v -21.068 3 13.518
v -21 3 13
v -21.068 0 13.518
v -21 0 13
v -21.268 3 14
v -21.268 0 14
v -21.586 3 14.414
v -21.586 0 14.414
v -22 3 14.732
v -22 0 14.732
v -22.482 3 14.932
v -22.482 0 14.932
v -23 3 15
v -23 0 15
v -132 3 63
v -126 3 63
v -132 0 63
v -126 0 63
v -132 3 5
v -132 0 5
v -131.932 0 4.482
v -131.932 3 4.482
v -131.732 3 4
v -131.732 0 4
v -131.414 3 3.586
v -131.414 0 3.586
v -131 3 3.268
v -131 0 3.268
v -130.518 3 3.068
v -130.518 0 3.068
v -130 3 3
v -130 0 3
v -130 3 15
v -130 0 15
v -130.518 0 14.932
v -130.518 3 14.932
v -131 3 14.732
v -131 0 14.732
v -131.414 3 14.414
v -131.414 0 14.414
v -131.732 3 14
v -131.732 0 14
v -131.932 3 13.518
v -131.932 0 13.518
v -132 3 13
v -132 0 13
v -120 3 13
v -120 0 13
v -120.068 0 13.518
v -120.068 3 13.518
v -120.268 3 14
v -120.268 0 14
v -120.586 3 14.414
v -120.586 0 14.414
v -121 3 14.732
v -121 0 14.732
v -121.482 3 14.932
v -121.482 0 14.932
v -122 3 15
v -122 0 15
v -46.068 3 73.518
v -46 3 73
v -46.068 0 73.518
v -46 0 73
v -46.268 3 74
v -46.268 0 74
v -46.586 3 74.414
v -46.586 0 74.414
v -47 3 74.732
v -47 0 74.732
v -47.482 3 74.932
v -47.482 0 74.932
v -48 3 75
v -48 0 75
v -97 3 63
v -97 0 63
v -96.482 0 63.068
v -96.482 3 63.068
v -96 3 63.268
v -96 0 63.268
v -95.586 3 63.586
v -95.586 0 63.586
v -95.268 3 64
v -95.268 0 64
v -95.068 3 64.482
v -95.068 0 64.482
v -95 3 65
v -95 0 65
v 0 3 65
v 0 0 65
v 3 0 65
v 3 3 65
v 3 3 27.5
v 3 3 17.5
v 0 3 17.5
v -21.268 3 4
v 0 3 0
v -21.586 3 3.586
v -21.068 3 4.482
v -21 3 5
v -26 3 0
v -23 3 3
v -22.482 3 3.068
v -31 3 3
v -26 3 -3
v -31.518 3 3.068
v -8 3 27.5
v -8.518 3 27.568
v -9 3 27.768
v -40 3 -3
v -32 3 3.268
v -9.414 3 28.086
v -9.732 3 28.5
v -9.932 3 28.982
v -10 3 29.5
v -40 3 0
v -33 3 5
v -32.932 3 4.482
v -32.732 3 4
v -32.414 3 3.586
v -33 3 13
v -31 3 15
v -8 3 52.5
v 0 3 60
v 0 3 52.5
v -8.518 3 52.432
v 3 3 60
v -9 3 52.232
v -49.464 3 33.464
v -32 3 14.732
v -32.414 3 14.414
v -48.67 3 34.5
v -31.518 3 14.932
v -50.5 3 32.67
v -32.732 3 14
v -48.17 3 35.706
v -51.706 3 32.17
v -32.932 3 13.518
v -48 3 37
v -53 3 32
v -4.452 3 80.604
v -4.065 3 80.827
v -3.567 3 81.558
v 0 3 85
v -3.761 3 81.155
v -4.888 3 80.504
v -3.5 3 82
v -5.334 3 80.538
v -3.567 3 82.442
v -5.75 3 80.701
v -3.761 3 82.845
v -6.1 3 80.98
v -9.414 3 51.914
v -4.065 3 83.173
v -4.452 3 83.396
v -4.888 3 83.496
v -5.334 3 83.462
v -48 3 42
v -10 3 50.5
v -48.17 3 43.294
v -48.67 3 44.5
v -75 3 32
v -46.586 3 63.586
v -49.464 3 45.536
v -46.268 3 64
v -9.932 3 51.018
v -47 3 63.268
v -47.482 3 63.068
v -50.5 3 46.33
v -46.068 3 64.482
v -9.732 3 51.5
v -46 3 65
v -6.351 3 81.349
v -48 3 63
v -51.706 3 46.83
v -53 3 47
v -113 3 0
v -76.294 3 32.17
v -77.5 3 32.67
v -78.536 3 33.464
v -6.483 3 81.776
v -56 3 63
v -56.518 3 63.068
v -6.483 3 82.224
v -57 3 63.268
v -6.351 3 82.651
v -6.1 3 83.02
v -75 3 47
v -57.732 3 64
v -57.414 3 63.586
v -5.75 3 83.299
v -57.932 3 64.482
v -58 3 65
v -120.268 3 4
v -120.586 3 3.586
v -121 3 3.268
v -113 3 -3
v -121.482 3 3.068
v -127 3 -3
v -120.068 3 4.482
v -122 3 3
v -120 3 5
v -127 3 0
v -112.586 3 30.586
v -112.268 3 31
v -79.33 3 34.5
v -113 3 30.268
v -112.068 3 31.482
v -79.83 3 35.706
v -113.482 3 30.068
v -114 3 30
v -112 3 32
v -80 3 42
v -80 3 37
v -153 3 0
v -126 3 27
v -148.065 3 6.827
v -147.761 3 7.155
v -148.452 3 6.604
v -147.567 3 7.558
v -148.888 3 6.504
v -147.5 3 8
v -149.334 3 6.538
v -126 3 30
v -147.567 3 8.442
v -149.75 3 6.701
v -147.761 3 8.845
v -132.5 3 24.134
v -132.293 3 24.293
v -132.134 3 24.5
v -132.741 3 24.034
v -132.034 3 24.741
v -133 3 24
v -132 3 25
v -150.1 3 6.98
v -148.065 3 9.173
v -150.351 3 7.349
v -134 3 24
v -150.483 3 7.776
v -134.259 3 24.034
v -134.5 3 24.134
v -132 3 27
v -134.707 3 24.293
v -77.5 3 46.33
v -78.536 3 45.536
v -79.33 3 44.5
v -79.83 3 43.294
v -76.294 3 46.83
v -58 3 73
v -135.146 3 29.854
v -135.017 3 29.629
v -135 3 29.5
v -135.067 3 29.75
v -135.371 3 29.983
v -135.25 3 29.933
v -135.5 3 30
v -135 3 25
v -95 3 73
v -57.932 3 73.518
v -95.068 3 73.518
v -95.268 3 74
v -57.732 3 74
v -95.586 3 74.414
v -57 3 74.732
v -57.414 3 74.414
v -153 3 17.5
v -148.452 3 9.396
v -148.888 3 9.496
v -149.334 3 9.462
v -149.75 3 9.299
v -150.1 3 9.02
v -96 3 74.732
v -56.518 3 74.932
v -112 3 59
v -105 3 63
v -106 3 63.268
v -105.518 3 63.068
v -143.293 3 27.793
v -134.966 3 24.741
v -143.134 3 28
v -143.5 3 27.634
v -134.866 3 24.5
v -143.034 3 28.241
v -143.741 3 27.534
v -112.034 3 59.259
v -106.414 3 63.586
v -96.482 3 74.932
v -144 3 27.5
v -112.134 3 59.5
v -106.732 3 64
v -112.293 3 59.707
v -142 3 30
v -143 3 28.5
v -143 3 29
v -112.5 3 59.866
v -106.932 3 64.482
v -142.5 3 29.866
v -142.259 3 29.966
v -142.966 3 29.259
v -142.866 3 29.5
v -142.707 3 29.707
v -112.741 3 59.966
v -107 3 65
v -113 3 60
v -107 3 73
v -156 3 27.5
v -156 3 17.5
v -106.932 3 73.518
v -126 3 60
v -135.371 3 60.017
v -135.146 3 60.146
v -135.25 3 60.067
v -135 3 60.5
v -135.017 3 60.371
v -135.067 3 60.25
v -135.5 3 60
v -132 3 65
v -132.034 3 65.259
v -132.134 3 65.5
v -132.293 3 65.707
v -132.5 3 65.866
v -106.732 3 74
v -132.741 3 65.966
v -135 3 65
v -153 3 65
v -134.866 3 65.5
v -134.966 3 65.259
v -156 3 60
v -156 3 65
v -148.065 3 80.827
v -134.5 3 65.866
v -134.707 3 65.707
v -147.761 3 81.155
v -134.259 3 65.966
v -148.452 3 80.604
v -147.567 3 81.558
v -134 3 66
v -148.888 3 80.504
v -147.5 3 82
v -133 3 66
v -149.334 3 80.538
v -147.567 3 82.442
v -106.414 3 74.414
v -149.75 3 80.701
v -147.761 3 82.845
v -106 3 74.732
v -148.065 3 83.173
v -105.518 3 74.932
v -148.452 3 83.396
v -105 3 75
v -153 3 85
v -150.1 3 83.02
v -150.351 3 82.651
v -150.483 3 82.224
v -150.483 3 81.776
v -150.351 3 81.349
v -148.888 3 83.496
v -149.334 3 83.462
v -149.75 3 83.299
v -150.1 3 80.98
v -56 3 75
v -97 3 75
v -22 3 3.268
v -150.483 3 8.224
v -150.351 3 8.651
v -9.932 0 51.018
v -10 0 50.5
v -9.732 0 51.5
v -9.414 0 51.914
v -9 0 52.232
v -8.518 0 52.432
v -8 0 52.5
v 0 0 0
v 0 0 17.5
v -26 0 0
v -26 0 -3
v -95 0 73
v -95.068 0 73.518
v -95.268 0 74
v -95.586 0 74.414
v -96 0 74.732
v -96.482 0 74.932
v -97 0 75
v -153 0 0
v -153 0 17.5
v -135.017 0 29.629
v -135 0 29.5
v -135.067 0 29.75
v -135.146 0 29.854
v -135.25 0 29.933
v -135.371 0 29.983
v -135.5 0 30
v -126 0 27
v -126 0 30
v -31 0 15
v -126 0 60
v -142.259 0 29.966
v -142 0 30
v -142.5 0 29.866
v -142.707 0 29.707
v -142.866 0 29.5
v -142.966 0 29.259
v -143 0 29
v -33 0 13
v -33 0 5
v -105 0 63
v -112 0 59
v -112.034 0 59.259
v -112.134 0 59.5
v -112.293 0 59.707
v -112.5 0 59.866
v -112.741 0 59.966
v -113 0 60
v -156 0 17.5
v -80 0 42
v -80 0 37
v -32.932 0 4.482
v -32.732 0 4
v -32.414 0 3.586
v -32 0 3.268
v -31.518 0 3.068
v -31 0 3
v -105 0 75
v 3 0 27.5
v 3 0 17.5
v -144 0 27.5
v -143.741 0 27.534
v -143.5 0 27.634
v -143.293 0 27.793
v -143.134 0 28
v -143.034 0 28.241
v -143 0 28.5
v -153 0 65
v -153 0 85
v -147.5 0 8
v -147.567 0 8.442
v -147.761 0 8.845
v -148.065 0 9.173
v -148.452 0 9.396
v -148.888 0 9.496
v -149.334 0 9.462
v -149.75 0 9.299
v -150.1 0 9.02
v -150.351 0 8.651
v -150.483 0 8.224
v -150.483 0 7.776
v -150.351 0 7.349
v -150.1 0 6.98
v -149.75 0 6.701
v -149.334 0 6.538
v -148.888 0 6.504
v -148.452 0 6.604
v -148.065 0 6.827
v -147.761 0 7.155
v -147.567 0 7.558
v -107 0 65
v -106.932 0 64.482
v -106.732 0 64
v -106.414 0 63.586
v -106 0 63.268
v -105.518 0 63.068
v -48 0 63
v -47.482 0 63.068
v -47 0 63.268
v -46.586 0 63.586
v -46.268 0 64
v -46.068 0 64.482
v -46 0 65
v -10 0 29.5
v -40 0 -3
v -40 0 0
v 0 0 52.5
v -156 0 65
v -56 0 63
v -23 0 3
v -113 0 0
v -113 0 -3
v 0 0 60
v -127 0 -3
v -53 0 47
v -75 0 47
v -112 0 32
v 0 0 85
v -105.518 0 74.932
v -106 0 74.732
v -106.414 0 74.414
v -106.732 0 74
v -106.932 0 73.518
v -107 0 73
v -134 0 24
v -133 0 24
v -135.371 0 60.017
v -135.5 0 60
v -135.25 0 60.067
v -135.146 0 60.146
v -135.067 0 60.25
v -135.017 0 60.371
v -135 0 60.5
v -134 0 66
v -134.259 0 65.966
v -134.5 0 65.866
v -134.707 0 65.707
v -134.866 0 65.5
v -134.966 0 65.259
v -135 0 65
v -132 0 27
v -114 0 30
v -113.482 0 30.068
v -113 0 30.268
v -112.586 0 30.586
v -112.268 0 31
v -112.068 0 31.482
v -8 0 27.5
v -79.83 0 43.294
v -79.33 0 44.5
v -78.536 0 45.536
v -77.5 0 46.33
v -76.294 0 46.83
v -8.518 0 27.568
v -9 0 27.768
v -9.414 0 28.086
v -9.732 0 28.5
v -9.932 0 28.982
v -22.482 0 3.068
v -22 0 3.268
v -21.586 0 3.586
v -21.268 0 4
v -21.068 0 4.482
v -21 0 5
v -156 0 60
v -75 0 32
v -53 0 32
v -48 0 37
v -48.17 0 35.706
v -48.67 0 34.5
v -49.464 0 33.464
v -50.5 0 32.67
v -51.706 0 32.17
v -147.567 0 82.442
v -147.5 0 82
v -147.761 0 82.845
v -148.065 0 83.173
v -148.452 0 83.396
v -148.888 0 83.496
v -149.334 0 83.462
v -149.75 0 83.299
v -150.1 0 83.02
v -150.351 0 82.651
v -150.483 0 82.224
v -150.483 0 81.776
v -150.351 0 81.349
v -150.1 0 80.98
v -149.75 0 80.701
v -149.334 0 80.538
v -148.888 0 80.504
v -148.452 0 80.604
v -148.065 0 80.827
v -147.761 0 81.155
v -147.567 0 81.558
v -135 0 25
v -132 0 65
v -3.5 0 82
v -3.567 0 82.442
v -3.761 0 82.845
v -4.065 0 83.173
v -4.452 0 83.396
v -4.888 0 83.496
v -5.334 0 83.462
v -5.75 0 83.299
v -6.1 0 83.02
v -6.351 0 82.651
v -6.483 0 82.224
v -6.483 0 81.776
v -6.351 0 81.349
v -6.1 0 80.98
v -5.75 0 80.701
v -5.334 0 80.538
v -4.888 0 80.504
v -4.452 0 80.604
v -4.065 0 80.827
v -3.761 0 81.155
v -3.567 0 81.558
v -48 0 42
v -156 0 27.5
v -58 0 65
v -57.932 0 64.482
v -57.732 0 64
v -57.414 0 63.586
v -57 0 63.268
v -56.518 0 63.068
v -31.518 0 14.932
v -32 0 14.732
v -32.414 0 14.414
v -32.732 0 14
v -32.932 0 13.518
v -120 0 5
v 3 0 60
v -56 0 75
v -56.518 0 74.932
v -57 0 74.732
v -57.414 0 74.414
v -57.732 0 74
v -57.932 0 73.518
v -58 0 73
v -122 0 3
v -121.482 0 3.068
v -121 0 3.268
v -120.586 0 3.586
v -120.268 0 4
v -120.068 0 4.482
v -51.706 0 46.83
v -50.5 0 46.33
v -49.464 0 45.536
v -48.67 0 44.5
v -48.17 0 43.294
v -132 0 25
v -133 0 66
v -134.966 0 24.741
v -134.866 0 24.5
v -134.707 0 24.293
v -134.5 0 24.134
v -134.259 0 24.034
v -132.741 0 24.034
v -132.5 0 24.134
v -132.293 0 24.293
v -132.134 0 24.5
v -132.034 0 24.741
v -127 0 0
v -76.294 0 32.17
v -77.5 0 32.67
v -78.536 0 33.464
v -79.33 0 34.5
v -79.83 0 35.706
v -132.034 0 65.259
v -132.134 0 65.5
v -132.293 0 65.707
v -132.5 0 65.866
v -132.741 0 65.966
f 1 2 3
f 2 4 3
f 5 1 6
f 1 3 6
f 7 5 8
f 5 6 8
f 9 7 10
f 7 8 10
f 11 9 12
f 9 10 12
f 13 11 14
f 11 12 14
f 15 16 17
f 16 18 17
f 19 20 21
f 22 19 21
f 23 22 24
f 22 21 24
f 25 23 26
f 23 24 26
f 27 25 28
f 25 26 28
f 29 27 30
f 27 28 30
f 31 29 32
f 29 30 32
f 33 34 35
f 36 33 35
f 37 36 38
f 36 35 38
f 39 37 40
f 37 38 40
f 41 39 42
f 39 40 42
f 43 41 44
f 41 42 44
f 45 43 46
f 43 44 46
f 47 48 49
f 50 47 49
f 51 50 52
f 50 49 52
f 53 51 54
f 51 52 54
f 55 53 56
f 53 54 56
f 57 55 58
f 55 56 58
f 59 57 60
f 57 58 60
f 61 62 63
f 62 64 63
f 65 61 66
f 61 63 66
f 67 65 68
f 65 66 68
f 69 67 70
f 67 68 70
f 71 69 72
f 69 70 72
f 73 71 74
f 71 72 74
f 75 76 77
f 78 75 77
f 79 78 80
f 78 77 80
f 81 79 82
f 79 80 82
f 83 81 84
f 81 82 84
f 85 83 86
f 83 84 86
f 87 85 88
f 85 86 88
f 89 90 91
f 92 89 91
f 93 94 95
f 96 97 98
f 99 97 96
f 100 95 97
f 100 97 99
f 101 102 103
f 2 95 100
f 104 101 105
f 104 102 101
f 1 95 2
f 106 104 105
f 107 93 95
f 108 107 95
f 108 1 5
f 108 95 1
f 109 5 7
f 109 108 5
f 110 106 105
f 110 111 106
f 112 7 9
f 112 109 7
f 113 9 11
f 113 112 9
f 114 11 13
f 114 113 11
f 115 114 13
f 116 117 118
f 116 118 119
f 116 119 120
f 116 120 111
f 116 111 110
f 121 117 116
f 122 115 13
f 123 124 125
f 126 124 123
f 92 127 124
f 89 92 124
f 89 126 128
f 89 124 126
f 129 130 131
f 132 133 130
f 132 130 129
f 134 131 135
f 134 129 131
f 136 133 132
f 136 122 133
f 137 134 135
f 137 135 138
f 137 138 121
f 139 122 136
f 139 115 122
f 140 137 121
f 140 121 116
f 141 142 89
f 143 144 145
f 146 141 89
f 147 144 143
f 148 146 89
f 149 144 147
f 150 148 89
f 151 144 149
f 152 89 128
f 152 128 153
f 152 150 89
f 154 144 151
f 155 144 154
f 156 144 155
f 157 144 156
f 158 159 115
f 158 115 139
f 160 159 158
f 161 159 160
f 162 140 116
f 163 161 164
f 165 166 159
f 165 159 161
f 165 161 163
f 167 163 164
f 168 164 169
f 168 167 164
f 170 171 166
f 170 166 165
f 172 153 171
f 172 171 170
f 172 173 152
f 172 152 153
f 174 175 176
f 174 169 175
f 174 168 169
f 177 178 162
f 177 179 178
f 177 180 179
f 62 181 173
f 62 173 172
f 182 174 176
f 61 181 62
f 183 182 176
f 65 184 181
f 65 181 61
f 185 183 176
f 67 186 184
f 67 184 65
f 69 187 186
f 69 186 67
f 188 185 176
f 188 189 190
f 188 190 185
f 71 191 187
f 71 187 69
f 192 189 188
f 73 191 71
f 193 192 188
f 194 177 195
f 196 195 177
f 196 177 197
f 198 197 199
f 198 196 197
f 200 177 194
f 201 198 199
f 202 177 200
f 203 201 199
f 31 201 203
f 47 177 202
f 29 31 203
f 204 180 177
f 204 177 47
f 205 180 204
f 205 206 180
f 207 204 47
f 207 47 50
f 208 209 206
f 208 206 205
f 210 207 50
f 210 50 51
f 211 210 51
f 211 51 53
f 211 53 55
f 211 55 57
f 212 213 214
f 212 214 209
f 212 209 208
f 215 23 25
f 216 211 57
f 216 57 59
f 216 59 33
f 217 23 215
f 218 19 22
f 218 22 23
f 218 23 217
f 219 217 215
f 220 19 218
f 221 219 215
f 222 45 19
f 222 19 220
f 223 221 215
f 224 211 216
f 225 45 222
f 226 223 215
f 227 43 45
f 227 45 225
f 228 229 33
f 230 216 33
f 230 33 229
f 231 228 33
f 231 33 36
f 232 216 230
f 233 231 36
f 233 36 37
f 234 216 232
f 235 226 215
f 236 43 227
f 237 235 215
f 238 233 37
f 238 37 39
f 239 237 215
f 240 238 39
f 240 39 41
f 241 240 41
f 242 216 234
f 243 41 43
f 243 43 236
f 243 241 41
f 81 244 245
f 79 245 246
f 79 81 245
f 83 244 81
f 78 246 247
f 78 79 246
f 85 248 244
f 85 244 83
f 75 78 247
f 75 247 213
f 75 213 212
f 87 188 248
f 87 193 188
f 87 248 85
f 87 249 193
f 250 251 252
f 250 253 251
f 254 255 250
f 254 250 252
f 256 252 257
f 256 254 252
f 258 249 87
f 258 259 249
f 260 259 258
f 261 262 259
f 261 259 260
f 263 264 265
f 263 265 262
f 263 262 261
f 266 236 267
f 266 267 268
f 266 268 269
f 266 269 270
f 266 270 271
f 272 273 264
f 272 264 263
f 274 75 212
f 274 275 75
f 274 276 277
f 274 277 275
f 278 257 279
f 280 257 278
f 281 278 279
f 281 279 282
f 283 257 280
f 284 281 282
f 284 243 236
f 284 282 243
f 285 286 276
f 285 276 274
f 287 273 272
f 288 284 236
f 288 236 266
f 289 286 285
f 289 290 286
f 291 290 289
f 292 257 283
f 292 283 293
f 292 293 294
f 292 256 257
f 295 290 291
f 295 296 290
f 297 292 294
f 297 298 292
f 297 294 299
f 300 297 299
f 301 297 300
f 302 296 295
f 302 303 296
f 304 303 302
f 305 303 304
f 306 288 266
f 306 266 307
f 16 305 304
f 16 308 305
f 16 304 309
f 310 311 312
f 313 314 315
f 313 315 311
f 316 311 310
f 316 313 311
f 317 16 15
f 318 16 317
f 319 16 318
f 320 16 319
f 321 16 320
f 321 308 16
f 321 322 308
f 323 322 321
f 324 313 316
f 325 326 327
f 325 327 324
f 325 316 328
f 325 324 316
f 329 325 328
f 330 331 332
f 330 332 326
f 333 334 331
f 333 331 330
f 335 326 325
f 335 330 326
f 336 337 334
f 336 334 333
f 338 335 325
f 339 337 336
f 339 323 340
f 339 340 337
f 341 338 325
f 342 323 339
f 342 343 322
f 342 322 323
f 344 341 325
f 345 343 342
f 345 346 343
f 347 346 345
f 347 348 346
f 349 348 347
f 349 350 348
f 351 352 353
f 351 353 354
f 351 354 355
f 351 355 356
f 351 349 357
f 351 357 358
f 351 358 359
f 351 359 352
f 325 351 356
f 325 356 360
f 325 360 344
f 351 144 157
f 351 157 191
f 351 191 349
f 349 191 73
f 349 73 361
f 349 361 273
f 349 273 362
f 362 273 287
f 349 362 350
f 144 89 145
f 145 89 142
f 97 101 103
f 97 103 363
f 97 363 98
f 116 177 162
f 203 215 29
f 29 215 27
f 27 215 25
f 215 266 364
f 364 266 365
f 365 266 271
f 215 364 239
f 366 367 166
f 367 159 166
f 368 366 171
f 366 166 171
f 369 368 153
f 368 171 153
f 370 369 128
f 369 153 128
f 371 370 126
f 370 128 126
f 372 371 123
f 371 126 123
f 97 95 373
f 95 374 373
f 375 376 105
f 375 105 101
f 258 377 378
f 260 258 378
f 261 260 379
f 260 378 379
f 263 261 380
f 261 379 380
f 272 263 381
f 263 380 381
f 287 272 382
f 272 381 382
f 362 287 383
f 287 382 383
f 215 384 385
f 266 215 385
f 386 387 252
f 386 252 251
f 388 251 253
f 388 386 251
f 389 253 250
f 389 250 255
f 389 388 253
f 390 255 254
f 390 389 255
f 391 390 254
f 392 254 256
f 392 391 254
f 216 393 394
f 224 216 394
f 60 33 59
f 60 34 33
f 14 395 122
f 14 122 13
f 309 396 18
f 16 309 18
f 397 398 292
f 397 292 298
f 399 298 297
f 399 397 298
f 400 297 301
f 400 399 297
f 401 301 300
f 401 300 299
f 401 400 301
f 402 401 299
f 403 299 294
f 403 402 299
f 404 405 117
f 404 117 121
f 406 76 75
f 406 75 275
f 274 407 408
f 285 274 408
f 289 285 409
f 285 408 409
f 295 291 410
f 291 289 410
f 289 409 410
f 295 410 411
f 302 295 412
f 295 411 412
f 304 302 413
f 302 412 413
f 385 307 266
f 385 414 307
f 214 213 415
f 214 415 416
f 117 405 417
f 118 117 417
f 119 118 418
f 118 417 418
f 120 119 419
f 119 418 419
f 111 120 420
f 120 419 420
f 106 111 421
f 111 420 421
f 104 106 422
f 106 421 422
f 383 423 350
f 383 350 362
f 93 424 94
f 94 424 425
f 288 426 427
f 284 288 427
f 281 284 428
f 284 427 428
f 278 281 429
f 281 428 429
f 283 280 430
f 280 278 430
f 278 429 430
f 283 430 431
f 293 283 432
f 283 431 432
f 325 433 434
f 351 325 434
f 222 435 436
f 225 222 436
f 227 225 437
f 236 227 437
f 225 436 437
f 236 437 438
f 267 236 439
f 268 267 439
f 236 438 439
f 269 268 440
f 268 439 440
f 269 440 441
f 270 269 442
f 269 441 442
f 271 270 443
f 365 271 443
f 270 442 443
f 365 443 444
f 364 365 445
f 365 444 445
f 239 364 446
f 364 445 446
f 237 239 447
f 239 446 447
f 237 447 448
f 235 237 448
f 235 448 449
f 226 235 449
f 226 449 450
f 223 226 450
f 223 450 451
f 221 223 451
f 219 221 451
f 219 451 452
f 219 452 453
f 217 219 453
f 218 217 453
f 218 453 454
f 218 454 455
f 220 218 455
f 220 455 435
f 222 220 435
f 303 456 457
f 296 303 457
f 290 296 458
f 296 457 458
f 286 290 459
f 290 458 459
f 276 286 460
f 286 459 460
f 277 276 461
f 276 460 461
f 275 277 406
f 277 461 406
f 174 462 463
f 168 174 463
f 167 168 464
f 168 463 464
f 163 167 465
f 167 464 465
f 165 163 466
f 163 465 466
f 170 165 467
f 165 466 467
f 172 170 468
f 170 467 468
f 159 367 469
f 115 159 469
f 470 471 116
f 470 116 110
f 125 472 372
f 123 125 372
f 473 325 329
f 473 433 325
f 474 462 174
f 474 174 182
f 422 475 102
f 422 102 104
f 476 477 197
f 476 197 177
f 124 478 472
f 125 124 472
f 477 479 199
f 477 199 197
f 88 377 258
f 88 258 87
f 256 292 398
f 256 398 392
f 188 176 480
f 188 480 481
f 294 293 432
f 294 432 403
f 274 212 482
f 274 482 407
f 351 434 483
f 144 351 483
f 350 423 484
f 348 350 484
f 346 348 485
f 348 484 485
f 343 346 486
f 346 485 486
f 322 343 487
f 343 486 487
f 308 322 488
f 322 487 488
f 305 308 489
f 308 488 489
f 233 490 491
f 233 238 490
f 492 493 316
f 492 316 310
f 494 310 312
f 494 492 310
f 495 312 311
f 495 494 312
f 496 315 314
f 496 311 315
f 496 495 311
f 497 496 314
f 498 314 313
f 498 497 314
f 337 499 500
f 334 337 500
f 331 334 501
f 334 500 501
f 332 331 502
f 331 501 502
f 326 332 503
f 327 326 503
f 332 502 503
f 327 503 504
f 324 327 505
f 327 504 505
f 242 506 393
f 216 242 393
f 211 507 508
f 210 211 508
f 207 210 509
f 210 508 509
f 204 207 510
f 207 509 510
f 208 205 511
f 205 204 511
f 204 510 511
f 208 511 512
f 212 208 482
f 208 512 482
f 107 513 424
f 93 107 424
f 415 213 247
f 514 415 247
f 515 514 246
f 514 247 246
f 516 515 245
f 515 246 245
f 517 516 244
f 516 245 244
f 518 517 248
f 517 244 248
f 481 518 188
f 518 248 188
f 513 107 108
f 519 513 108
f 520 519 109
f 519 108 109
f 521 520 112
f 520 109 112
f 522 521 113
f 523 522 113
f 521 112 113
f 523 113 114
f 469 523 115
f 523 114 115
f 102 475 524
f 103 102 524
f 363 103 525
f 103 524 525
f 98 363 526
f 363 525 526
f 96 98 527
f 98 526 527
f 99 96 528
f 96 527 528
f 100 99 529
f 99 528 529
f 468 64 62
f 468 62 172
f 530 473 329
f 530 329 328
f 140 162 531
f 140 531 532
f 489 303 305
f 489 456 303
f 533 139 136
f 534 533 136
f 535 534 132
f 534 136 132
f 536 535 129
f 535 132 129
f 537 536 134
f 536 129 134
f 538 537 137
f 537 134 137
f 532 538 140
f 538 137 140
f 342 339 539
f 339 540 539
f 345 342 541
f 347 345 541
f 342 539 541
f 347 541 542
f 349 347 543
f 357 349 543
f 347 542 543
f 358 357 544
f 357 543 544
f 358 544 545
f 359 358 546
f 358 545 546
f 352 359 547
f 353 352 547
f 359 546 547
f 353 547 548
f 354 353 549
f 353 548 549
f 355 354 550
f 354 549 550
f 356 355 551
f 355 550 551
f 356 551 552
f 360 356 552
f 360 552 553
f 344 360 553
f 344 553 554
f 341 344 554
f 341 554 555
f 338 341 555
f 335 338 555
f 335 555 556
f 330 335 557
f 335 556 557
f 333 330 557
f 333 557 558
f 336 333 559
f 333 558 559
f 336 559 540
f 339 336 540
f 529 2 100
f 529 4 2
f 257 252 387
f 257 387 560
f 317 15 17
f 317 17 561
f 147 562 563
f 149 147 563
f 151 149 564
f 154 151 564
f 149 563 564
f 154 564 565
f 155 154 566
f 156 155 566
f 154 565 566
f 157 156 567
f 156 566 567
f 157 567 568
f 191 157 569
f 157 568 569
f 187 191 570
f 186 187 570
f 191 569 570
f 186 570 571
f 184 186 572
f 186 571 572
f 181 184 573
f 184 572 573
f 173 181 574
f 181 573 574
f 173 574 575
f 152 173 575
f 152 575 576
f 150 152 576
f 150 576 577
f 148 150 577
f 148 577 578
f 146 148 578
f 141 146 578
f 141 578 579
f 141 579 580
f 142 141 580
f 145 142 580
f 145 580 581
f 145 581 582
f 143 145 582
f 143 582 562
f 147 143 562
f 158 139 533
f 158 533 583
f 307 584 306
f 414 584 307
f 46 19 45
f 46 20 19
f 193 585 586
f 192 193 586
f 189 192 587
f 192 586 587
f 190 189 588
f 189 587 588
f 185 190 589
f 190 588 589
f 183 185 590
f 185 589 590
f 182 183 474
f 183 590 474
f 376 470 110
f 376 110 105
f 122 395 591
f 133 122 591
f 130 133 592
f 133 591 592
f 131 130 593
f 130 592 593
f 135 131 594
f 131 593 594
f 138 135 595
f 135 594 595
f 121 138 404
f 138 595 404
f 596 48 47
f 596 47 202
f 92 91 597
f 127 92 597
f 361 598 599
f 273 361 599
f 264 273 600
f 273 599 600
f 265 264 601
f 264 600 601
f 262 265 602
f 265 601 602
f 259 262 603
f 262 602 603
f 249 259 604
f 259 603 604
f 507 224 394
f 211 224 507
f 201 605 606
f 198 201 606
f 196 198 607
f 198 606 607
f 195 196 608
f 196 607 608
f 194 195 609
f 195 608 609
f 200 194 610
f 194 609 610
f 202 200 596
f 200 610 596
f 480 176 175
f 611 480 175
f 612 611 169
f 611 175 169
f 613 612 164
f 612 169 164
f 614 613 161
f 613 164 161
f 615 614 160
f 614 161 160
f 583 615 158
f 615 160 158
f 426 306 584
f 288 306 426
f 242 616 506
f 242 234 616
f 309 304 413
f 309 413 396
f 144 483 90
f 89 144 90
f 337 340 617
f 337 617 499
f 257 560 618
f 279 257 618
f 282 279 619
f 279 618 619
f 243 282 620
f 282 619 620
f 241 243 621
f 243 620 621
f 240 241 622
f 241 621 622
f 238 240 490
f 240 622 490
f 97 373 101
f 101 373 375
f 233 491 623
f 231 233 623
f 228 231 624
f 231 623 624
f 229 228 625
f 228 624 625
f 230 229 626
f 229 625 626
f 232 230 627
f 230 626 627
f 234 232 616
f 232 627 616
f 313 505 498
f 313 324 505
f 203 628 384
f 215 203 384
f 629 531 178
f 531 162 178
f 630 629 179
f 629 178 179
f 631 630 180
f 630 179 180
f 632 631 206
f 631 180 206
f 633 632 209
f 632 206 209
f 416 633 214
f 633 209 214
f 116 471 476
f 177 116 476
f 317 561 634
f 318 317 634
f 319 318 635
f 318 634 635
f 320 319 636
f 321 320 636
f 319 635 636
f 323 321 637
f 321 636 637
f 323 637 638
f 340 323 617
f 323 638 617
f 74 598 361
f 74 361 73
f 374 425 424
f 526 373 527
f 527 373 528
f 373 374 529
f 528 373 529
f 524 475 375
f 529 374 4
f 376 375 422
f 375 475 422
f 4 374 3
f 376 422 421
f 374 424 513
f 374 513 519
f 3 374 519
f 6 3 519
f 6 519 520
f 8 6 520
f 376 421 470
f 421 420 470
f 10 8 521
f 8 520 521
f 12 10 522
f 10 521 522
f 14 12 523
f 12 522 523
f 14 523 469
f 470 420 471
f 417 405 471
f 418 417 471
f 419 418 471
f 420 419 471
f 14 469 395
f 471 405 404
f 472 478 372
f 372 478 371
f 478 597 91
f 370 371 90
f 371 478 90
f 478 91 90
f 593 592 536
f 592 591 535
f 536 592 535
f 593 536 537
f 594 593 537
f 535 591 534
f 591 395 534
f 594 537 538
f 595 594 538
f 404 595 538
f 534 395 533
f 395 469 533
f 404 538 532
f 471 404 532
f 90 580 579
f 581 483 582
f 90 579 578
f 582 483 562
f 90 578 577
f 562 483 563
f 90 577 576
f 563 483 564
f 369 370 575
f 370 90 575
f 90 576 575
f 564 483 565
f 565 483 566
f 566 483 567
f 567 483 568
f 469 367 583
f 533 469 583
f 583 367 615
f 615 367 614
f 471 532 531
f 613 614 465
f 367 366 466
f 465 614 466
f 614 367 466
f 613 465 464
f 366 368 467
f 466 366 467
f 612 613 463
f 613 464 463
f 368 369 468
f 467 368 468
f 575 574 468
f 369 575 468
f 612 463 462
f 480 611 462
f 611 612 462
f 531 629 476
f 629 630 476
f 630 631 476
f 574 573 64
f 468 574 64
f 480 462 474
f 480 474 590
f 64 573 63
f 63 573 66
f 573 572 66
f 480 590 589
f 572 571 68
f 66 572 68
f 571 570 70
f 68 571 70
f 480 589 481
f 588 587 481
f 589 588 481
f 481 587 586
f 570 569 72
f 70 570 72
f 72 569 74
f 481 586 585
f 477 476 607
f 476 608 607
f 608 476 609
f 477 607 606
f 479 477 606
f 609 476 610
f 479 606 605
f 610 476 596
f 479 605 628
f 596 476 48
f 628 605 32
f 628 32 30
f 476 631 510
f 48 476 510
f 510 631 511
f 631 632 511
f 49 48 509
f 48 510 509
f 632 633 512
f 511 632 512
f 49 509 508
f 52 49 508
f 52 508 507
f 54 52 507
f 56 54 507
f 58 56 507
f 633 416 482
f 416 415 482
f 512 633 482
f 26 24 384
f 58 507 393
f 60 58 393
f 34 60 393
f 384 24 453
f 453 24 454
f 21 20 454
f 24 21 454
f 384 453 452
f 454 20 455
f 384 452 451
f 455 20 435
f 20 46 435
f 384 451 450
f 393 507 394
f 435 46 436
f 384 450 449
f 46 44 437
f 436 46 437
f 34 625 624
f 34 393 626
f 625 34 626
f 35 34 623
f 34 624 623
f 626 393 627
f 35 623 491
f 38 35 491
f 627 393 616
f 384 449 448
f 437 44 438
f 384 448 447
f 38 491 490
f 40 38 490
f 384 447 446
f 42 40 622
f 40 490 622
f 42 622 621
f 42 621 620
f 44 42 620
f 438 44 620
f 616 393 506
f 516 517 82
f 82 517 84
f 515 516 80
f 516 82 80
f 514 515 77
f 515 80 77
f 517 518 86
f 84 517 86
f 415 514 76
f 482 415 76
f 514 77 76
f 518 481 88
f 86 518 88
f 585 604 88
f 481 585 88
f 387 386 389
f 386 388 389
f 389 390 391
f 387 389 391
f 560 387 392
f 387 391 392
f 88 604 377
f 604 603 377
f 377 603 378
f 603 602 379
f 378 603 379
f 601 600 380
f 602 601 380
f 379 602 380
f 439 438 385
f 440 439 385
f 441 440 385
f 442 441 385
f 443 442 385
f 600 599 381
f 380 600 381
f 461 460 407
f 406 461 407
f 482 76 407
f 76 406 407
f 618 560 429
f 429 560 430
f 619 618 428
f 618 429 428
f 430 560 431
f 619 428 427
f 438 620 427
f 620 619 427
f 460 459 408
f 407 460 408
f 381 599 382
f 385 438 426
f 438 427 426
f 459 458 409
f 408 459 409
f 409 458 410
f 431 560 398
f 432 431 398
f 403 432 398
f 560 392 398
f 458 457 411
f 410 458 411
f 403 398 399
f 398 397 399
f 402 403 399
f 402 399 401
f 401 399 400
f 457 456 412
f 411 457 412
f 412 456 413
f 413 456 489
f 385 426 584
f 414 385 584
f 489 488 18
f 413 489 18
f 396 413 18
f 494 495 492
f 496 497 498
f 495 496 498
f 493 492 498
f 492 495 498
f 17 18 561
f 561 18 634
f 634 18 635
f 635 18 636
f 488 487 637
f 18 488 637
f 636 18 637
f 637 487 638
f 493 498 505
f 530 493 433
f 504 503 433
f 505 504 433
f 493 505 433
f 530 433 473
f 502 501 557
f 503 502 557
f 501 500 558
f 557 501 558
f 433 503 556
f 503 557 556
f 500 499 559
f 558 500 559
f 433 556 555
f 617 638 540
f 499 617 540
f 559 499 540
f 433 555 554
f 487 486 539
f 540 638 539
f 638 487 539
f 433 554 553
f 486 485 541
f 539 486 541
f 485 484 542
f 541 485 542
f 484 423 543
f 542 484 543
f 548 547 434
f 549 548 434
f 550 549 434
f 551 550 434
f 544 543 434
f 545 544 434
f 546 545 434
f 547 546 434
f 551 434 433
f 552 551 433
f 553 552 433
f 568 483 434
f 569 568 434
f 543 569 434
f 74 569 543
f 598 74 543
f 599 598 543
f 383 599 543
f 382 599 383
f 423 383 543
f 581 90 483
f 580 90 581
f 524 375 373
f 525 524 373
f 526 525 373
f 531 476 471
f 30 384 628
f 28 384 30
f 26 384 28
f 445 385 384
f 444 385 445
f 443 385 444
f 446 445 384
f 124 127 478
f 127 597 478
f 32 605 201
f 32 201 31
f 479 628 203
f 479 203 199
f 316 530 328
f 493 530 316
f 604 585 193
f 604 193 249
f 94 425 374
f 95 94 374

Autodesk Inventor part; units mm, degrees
ref_plane "YZ Plane" through (0, 0, 0) normal (1, 0, 0) x (0, 1, 0)
ref_plane "XZ Plane" through (0, 0, 0) normal (0, 1, 0) x (-1, 0, 0)
ref_plane "XY Plane" through (0, 0, 0) normal (0, 0, 1) x (1, 0, 0)
sketch "Sketch1" plane through (0, 0, 0) normal (0, 1, 0) x (-1, 0, 0)
  line L0 (153, 85) -> (0, 85)
  line L1 (0, 65) -> (-3, 65)
  line L2 (-3, 65) -> (-3, 60)
  line L3 (-3, 60) -> (0, 60)
  line L4 (0, 40) -> (153, 40) construction
  line L5 (0, 27.5) -> (-3, 27.5)
  line L6 (-3, 27.5) -> (-3, 17.5)
  line L7 (-3, 17.5) -> (0, 17.5)
  line L8 (153, 65) -> (156, 65)
  line L9 (156, 65) -> (156, 60)
  line L10 (156, 60) -> (153, 60)
  line L11 (153, 27.5) -> (156, 27.5)
  line L12 (156, 27.5) -> (156, 17.5)
  line L13 (156, 17.5) -> (153, 17.5)
  line L14 (153, 65) -> (153, 85)
  line L15 (153, 0) -> (153, 17.5)
  line L16 (153, 27.5) -> (153, 60)
  line L17 (0, 85) -> (0, 65)
  line L18 (0, 60) -> (0, 27.5)
  line L19 (0, 17.5) -> (0, 0)
  line L20 (40, 0) -> (40, -3)
  line L21 (40, -3) -> (26, -3)
  line L22 (26, -3) -> (26, 0)
  line L23 (127, 0) -> (127, -3)
  line L24 (127, -3) -> (113, -3)
  line L25 (113, -3) -> (113, 0)
  line L26 (0, 0) -> (26, 0)
  line L27 (40, 0) -> (113, 0)
  line L28 (127, 0) -> (153, 0)
  dimension "d0" = 85
  dimension "d1" = 153
  dimension "d3" = 3
  dimension "d4" = 20
  dimension "d5" = 10
  dimension "d6" = 3
  dimension "d9" = 3
  dimension "d10" = 10
  dimension "d11" = 3
  dimension "d12" = 12.5
  dimension "d13" = 20
  dimension "d16" = 20
  dimension "d39" = 14
  dimension "d40" = 3
  dimension "d41" = 14
  dimension "d42" = 3
  dimension "d43" = 26
  dimension "d44" = 26
  dimension "d64" = 12.5
  dimension "d65" = 5
  dimension "d66" = 5
extrude "Extrusion1" add sketch "Sketch1" along normal blind 3
sketch "Sketch2" plane through (0, 3, 0) normal (0, 1, 0) x (1, 0, 0)
  line L0 (-153, -27.5) -> (-153, -60) projected
  line L1 (0, -60) -> (0, -27.5) projected
  line L2 (-143, -30) -> (-135, -30)
  line L3 (-135, -60) -> (-153, -60)
  line L4 (-135, -24) -> (-132, -24)
  line L5 (-132, -66) -> (-135, -66)
  line L6 (-132, -30) -> (-112, -30)
  line L7 (-112, -30) -> (-112, -60)
  line L8 (-112, -60) -> (-132, -60)
  line L9 (-132, -24) -> (-132, -30)
  line L10 (-132, -60) -> (-132, -66)
  line L11 (-135, -66) -> (-135, -60)
  line L12 (-135, -30) -> (-135, -24)
  line L13 (-153, -60) -> (-153, -30)
  line L14 (3, -27.5) -> (3, -17.5) projected
  line L15 (-153, -40) -> (0, -40) construction
  line L16 (0, -27.5) -> (3, -27.5) projected
  line L17 (-153, -27.5) -> (-143, -27.5)
  line L18 (-143, -27.5) -> (-143, -30)
  point P0 (-156, -60)
  dimension "d22" = 42
  dimension "d24" = 3
  dimension "d26" = 6
  dimension "d29" = 41
  dimension "d67" = 20
  dimension "d68" = 10
  dimension "d69" = 20
  dimension "d70" = 6
  dimension "d109" = 10
  dimension "d154" = 2.5
extrude "Extrusion2" cut sketch "Sketch2" against normal through all
sketch "Sketch3" plane through (0, 3, 0) normal (0, 1, 0) x (1, 0, 0)
  line L0 (-153, -85) -> (0, -85) projected
  line L1 (0, -60) -> (0, -27.5) projected
  line L2 (-112, -30) -> (-112, -60) projected
  line L3 (-48, -37) -> (-48, -42)
  line L4 (-53, -47) -> (-75, -47)
  arc A0 (-48, -37) -> (-53, -32) centre (-53, -37) ccw
  arc A1 (-53, -47) -> (-48, -42) centre (-53, -42) ccw
  arc A2 (-80, -42) -> (-75, -47) centre (-75, -42) ccw
  line L5 (-40, 0) -> (-113, 0) projected
  line L6 (-75, -32) -> (-53, -32)
  line L7 (-80, -42) -> (-80, -37)
  arc A3 (-75, -32) -> (-80, -37) centre (-75, -37) ccw
  point P0 (-115, -26)
  point P1 (-115, -30)
  point P2 (-116, -20)
  point P3 (-79, 0)
  point P4 (-73, 0)
  point P5 (-112, -32)
  point P6 (-112, -26)
  dimension "d34" = 38
  dimension "d35" = 48
  dimension "d116" = 32
  dimension "d117" = 5
  dimension "d177" = 5
  dimension "d178" = 32
extrude "Extrusion3" cut sketch "Sketch3" against normal through all
sketch "Sketch6" plane through (0, 0, 0) normal (0, -1, 0) x (1, 0, 0)
  line L0 (0, 27.5) -> (0, 60) projected
  line L1 (-156, 60) -> (-135, 60) projected
  line L2 (0, 52.5) -> (-10, 52.5)
  line L3 (-10, 52.5) -> (-10, 27.5)
  line L4 (-10, 27.5) -> (0, 27.5)
  line L5 (0, 27.5) -> (0, 52.5)
  line L6 (0, 40) -> (-157, 40) construction
  point P0 (-143, 60)
  dimension "d74" = 10
  dimension "d76" = 25
  dimension "d77" = 20
  dimension "d78" = 12.5
extrude "Extrusion6" cut sketch "Sketch6" against normal through all
fillet "Fillet2" radius 2 2 edges at (-10, 1.5, 52.5) (-10, 1.5, 27.5)
fillet "Fillet4" radius 1 1 edges at (-112, 1.5, 60)
sketch "Sketch5" plane through (0, 0, 0) normal (0, -1, 0) x (1, 0, 0)
  line L0 (0, 85) -> (-153, 85) projected
  line L1 (-153, 85) -> (-153, 65) projected
  circle A0 centre (-149, 82) radius 1.5
  circle A1 centre (-149, 8) radius 1.5
  circle A2 centre (-5, 82) radius 1.5
  circle A3 centre (-29, 8) radius 1.5
  point P0 (-154, 50.75)
  dimension "d51" = 3
  dimension "d53" = 4
  dimension "d54" = 3
  dimension "d56" = 3
  dimension "d57" = 74
  dimension "d58" = 144
  dimension "d59" = 3
  dimension "d60" = 3
  dimension "d61" = 24
extrude "Extrusion8" cut sketch "Sketch5" against normal through all
fillet "Fillet10" radius 2 1 edges at (-112, 1.5, 30)
sketch "Sketch10" plane through (0, 0, 0) normal (0, -1, 0) x (1, 0, 0)
  line L0 (-130, 15) -> (-122, 15)
  line L1 (-120, 13) -> (-120, 5)
  line L2 (-122, 3) -> (-130, 3)
  line L3 (-132, 5) -> (-132, 13)
  line L4 (-153, 85) -> (-153, 65) projected
  line L5 (0, 85) -> (-153, 85) projected
  arc A0 (-132, 5) -> (-130, 3) centre (-130, 5) ccw
  arc A1 (-122, 3) -> (-120, 5) centre (-122, 5) ccw
  arc A2 (-120, 13) -> (-122, 15) centre (-122, 13) ccw
  arc A3 (-130, 15) -> (-132, 13) centre (-130, 13) ccw
  line L6 (-31, 15) -> (-23, 15)
  line L7 (-21, 13) -> (-21, 5)
  line L8 (-23, 3) -> (-31, 3)
  line L9 (-33, 5) -> (-33, 13)
  line L10 (0, 65) -> (0, 85) projected
  arc A4 (-31, 15) -> (-33, 13) centre (-31, 13) ccw
  arc A5 (-21, 13) -> (-23, 15) centre (-23, 13) ccw
  arc A6 (-23, 3) -> (-21, 5) centre (-23, 5) ccw
  arc A7 (-33, 5) -> (-31, 3) centre (-31, 5) ccw
  line L11 (-153, 0) -> (-127, 0) projected
  point P0 (0, 0)
  point P1 (-132, 15)
  point P2 (-120, 3)
  point P3 (-132, 3)
  point P4 (-21, 3)
  point P5 (-21, 15)
  point P6 (-33, 3)
  point P7 (-126, 15)
  point P8 (-27, 15)
  dimension "d135" = 12
  dimension "d136" = 12
  dimension "d137" = 21
  dimension "d139" = 2
  dimension "d142" = 12
  dimension "d143" = 12
  dimension "d145" = 21
  dimension "d146" = 2
  dimension "d155" = 3
extrude "Extrusion13" cut sketch "Sketch10" against normal through all
fillet "Fillet11" radius 1 2 edges at (-143, 1.5, 30) (-143, 1.5, 27.5)
fillet "Fillet12" radius 1 2 edges at (-132, 1.5, 66) (-132, 1.5, 24)
fillet "Fillet13" radius 0.5 2 edges at (-135, 1.5, 60) (-135, 1.5, 30)
fillet "Fillet14" radius 1 2 edges at (-135, 1.5, 24) (-135, 1.5, 66)
sketch "Sketch11" plane through (0, 0, 0) normal (0, -1, 0) x (1, 0, 0)
  line L0 (-126, 30) -> (-132, 30)
  line L1 (-132, 30) -> (-132, 27)
  line L2 (-132, 27) -> (-126, 27)
  line L3 (-126, 27) -> (-126, 30)
  line L4 (-114, 30) -> (-132, 30) projected
  line L5 (-132, 30) -> (-132, 25) projected
  line L6 (-132, 60) -> (-126, 60)
  line L7 (-126, 60) -> (-126, 63)
  line L8 (-126, 63) -> (-132, 63)
  line L9 (-132, 63) -> (-132, 60)
  line L10 (-132, 60) -> (-113, 60) projected
  point P0 (0, 0)
  point P1 (-130, 30)
  point P2 (-132, 28)
  point P3 (-130, 60)
  dimension "d158" = 6
  dimension "d159" = 3
  dimension "d163" = 3
extrude "Extrusion14" cut sketch "Sketch11" against normal through all
sketch "Sketch12" plane through (0, 0, 0) normal (0, -1, 0) x (1, 0, 0)
  line L0 (-105, 75) -> (-97, 75)
  line L1 (-95, 73) -> (-95, 65)
  line L2 (-97, 63) -> (-105, 63)
  line L3 (-107, 65) -> (-107, 73)
  line L4 (-107, 75) -> (-95, 63) construction
  line L5 (-95, 75) -> (-107, 63) construction
  line L6 (-153, 85) -> (-153, 65) projected
  line L7 (0, 85) -> (-153, 85) projected
  line L8 (-48, 63) -> (-56, 63)
  line L9 (-58, 65) -> (-58, 73)
  line L10 (-56, 75) -> (-48, 75)
  line L11 (-46, 73) -> (-46, 65)
  line L12 (-46, 63) -> (-58, 75) construction
  line L13 (-58, 63) -> (-46, 75) construction
  line L14 (0, 65) -> (0, 85) projected
  arc A0 (-105, 75) -> (-107, 73) centre (-105, 73) ccw
  arc A1 (-95, 73) -> (-97, 75) centre (-97, 73) ccw
  arc A2 (-97, 63) -> (-95, 65) centre (-97, 65) ccw
  arc A3 (-107, 65) -> (-105, 63) centre (-105, 65) ccw
  arc A4 (-56, 75) -> (-58, 73) centre (-56, 73) ccw
  arc A5 (-46, 73) -> (-48, 75) centre (-48, 73) ccw
  arc A6 (-48, 63) -> (-46, 65) centre (-48, 65) ccw
  arc A7 (-58, 65) -> (-56, 63) centre (-56, 65) ccw
  point P0 (0, 0)
  point P1 (-101, 69)
  point P2 (-52, 69)
  dimension "d166" = 52
  dimension "d167" = 16
  dimension "d168" = 12
  dimension "d169" = 12
  dimension "d170" = 16
  dimension "d171" = 52
  dimension "d172" = 12
  dimension "d173" = 12
  dimension "d174" = 2
extrude "Extrusion15" cut sketch "Sketch12" against normal through all
properties part number "MainPanelCover6"
